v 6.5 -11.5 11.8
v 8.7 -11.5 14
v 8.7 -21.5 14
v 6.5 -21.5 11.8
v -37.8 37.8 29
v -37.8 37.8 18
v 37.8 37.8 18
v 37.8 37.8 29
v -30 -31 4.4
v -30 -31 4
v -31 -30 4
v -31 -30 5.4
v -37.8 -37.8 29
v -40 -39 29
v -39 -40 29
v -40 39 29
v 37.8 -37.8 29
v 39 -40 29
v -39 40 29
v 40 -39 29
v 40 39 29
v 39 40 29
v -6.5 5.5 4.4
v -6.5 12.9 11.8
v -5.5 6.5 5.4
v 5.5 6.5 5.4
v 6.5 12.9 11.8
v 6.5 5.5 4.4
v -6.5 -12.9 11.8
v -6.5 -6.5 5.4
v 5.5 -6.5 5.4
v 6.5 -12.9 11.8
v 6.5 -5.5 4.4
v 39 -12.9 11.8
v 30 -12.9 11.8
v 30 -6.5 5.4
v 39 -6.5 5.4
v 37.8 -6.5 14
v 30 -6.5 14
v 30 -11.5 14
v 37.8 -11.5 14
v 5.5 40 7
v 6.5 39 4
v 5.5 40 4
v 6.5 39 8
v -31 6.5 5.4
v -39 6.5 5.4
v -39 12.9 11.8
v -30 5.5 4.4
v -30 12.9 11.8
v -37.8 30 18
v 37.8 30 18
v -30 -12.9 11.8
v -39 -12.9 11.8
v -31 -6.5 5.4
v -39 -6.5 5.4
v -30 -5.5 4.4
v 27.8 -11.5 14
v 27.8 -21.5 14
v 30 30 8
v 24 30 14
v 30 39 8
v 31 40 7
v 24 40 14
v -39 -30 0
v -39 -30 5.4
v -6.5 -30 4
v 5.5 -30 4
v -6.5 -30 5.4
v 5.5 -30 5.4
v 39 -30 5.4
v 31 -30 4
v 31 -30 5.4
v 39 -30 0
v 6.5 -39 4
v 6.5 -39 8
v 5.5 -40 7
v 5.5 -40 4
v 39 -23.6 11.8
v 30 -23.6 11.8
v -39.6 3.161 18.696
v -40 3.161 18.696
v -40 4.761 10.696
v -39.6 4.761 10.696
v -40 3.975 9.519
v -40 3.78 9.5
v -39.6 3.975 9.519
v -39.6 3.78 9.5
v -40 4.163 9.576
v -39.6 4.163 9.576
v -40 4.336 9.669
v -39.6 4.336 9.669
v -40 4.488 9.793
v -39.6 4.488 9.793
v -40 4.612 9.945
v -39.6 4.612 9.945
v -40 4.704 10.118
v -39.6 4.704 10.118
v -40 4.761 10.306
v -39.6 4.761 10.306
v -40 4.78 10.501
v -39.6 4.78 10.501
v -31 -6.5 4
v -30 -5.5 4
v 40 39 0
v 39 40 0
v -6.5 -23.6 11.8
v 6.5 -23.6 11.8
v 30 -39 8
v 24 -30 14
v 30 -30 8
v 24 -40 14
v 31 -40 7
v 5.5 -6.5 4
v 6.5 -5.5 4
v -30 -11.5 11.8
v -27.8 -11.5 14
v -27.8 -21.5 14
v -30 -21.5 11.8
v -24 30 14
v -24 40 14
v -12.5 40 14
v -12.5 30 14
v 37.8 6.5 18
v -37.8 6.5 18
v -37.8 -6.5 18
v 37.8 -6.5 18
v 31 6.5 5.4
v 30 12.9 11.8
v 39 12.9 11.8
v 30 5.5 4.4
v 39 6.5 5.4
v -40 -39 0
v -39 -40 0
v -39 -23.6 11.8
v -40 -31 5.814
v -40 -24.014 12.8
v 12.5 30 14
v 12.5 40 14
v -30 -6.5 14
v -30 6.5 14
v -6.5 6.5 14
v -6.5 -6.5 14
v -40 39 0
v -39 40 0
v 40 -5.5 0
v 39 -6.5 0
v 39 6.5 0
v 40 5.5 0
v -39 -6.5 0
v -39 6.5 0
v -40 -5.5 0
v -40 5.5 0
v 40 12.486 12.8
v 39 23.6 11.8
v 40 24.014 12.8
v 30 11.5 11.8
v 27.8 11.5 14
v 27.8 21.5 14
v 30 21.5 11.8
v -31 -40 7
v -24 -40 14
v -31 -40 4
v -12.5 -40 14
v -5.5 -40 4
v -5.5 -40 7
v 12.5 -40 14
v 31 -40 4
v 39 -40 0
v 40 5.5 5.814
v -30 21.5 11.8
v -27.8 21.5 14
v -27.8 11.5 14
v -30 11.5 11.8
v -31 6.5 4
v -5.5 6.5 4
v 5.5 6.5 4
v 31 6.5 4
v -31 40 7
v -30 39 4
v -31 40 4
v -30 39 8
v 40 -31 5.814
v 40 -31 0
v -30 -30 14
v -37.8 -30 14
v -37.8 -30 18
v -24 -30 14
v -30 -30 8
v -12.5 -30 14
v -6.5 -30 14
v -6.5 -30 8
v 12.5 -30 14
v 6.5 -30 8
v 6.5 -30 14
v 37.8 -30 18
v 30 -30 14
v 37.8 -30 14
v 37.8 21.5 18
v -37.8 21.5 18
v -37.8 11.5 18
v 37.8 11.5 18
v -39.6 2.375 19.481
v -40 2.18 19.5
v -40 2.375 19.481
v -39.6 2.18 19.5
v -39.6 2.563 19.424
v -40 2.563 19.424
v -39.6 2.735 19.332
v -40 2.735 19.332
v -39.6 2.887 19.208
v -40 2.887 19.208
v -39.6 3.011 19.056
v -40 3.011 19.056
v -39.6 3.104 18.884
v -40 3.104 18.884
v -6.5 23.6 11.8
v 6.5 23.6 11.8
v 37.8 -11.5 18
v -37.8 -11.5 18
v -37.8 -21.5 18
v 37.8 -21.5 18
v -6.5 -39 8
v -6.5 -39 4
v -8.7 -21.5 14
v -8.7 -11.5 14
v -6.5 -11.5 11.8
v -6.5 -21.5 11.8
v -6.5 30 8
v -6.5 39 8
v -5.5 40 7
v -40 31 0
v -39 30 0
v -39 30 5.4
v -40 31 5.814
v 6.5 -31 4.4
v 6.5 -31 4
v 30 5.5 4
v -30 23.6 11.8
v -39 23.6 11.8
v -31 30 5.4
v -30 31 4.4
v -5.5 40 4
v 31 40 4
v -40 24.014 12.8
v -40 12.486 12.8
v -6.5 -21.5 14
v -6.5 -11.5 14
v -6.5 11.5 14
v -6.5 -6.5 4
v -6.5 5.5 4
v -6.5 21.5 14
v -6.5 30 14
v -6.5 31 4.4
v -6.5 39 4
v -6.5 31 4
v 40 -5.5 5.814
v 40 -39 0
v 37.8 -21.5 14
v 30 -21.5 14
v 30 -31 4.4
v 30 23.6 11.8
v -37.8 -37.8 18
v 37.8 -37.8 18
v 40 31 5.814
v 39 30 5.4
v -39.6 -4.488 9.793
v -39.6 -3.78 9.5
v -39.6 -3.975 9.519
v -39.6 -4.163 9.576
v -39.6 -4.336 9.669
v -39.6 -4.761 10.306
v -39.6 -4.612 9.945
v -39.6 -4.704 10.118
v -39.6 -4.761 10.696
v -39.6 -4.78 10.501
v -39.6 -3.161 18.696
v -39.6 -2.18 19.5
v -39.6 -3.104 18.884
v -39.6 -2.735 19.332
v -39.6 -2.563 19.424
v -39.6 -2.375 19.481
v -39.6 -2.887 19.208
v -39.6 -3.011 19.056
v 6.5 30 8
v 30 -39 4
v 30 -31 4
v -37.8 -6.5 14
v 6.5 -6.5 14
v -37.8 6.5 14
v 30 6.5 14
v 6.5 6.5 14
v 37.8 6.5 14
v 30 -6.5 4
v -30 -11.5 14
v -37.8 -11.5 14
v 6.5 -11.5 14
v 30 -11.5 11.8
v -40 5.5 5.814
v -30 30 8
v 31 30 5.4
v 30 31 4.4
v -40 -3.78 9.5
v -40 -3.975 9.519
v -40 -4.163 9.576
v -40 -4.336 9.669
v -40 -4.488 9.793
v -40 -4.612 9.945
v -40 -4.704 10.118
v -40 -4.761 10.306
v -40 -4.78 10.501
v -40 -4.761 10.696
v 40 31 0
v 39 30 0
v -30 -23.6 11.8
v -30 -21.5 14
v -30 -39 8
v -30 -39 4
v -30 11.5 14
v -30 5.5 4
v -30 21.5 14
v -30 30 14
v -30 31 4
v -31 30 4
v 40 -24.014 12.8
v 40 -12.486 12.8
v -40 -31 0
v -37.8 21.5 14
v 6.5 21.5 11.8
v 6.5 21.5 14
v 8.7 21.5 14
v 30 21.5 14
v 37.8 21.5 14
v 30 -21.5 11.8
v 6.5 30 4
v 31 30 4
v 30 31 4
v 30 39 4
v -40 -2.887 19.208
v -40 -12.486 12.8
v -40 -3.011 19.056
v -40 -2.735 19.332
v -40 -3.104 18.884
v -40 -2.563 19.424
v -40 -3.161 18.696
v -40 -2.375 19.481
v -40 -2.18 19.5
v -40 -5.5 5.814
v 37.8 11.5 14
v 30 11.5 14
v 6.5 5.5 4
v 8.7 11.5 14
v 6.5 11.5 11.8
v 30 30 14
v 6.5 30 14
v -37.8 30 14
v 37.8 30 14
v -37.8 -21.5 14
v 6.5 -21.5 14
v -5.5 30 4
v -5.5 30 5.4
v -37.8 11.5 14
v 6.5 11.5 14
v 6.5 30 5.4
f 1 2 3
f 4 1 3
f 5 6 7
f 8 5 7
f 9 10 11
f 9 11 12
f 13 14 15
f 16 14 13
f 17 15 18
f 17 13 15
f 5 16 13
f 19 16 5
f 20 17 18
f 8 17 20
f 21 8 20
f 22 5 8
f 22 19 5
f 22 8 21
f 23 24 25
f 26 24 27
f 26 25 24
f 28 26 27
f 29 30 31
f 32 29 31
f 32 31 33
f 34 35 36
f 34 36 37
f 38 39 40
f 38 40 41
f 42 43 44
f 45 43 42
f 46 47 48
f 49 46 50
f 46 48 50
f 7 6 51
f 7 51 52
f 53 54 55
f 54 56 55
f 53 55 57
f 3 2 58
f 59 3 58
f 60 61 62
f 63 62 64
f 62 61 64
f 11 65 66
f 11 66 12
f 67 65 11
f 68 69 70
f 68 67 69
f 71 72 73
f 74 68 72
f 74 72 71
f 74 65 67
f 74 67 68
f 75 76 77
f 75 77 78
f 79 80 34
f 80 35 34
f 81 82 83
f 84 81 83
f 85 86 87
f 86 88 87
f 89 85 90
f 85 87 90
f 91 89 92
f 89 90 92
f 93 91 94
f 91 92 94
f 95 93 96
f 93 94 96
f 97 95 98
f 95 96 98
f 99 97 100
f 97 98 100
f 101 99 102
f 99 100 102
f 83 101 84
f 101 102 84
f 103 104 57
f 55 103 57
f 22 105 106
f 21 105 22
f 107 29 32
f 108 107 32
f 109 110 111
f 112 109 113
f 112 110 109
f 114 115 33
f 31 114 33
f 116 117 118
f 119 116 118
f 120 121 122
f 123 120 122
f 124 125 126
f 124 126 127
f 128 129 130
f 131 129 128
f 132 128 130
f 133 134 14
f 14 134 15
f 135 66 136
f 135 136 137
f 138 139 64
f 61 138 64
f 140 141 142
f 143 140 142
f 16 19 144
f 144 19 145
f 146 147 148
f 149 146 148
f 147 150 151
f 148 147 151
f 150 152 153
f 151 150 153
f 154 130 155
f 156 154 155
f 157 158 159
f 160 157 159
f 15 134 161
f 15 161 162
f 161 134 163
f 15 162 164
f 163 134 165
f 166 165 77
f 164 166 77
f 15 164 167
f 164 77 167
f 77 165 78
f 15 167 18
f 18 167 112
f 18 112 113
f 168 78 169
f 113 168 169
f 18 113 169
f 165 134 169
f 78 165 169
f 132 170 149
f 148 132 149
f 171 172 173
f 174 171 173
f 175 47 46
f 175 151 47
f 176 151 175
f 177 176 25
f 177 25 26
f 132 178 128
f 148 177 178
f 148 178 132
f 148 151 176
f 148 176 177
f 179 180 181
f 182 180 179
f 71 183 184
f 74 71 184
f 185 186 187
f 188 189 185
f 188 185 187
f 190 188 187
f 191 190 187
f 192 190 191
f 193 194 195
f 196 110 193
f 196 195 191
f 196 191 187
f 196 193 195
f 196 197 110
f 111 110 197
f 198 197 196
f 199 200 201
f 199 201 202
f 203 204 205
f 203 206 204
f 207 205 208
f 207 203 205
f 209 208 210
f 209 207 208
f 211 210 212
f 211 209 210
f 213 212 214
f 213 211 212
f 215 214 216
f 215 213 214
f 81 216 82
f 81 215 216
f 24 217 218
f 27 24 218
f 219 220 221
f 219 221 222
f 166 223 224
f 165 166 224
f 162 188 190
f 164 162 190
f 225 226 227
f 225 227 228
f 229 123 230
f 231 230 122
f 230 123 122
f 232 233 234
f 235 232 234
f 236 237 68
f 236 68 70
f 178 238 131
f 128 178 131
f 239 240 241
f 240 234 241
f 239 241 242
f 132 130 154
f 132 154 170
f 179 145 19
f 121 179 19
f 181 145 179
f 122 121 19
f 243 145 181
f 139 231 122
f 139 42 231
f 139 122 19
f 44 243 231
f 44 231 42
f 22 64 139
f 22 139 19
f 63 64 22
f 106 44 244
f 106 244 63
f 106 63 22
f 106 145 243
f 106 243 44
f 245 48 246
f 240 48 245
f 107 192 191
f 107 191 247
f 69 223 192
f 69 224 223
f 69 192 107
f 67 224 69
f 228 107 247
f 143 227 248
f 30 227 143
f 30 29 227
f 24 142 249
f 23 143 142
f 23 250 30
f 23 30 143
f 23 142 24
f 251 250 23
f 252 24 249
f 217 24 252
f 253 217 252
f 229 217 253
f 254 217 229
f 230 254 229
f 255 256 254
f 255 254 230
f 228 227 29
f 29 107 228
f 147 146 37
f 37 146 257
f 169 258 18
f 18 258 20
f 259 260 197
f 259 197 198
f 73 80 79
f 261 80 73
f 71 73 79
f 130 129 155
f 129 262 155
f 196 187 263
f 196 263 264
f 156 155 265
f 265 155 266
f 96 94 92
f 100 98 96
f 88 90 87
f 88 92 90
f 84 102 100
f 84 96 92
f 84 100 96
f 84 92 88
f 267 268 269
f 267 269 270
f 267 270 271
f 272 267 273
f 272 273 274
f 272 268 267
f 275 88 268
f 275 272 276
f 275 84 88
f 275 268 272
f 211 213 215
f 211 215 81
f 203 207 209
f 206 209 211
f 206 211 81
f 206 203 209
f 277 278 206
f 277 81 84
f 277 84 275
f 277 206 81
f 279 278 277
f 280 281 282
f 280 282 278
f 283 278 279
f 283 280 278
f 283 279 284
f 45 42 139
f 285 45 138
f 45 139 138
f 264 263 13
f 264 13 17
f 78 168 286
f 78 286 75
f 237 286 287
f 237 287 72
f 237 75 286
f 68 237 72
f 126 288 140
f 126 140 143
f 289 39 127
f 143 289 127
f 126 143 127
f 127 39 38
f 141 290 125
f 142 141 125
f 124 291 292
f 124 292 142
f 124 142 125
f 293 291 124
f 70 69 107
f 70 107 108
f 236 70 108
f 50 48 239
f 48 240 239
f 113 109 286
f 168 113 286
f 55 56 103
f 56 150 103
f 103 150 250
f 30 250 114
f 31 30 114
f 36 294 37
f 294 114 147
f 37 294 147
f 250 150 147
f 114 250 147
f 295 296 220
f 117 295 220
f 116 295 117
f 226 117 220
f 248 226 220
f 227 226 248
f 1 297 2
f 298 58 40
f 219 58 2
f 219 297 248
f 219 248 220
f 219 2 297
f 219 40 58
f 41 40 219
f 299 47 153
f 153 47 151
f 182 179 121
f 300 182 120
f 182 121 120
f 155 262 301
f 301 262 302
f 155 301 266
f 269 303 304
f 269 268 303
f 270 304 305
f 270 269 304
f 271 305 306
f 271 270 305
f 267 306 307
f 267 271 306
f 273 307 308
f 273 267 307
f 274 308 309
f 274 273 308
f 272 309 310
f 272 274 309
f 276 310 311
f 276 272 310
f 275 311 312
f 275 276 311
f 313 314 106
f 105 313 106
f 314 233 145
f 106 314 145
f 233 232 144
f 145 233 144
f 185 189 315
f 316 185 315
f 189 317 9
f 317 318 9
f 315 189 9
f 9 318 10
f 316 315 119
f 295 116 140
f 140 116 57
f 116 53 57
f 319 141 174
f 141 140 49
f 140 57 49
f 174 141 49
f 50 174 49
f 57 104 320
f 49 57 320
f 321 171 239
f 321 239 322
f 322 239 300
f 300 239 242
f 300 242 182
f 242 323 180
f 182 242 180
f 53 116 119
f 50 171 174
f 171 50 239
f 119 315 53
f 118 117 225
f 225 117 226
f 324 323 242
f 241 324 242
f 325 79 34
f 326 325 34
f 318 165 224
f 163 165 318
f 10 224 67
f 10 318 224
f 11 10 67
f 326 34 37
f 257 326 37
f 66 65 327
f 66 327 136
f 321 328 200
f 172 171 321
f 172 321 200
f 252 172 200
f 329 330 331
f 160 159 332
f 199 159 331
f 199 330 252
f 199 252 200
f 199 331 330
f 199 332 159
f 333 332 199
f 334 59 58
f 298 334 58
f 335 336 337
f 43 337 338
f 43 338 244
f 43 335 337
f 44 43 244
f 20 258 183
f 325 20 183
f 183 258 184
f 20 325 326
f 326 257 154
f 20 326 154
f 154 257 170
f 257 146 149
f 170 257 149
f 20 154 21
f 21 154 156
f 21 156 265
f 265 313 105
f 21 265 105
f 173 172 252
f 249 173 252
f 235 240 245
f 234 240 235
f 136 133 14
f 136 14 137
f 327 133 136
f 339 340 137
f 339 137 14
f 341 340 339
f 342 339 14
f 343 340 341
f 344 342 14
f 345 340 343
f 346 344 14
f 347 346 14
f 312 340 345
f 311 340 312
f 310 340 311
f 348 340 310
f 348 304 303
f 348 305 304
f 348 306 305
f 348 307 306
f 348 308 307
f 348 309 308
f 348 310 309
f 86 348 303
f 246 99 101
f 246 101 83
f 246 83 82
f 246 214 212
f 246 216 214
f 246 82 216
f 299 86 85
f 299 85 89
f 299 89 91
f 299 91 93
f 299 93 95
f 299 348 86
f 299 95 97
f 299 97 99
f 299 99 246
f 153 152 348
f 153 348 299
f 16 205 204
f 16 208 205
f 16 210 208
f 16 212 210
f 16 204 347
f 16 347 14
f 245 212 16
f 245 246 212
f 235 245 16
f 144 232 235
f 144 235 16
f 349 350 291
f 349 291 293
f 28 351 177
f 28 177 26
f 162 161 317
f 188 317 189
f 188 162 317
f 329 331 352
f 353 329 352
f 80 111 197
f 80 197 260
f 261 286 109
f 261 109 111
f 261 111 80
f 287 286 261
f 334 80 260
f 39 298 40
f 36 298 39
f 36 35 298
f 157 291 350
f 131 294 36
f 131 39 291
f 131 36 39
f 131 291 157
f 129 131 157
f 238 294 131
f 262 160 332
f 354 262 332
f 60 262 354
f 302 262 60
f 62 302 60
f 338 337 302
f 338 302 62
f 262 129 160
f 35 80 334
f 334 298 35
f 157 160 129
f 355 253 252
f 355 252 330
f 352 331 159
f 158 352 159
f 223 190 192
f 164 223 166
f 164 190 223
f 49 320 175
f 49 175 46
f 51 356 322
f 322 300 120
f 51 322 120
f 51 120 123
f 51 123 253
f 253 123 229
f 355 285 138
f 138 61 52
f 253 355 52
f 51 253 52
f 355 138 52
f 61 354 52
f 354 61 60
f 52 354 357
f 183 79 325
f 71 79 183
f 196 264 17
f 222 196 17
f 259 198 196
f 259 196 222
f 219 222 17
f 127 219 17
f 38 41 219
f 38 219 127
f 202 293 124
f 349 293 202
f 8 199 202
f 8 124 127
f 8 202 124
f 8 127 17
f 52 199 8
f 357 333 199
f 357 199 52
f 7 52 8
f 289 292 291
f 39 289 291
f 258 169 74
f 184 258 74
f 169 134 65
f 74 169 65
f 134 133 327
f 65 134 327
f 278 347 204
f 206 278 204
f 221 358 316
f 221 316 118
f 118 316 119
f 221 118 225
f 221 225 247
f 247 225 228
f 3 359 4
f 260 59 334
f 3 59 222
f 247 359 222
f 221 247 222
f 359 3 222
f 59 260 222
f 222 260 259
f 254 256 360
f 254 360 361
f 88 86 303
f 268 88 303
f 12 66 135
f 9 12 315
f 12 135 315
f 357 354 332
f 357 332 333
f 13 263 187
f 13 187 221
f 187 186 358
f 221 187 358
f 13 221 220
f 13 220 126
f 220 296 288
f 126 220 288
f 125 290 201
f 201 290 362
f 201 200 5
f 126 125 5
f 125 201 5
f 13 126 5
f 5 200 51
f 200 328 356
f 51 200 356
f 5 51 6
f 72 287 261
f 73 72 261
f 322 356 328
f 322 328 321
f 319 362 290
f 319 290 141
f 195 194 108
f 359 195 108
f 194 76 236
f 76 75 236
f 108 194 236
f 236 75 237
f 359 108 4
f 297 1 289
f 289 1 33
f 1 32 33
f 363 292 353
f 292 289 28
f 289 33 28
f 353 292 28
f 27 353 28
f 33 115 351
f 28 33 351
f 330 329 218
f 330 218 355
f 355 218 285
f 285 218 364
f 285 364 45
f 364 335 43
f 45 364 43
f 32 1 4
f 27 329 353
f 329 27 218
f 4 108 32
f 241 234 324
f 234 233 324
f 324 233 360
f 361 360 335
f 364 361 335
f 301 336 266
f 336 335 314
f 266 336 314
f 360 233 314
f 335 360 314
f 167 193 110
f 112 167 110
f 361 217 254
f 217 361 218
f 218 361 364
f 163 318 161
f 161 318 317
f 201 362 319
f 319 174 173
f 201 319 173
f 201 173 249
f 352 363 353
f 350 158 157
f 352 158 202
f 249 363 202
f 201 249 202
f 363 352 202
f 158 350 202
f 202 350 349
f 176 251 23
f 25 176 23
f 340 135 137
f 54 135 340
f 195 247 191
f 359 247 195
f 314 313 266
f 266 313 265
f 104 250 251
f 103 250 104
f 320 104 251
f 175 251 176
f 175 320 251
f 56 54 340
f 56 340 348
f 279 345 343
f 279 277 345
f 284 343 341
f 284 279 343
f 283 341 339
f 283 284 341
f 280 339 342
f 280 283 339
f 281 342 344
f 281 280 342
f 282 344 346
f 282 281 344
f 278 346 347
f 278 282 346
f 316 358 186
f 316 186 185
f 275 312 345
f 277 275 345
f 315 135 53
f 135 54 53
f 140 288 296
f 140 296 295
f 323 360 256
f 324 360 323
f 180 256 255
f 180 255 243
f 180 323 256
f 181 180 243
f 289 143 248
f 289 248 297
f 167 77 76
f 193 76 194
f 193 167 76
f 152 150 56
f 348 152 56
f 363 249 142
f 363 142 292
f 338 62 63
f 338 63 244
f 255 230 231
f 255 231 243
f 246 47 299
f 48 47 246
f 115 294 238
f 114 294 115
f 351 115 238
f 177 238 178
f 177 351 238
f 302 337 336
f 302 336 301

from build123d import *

# Parameters (mm, degrees)
CROQUIS1_W                = 13
CROQUIS1_H                = 80
SALIENTE_EXTRUIR1_DEPTH   = 4
CROQUIS1_W_2              = 10
SALIENTE_EXTRUIR1_2_DEPTH = 4
SALIENTE_EXTRUIR1_3_DEPTH = 4
CROQUIS2_W                = 13
CROQUIS2_H                = 13
CROQUIS2_W_2              = 10
CROQUIS2_H_2              = 10
SALIENTE_EXTRUIR2_DEPTH   = 10
CROQUIS3_W                = 13
CROQUIS3_H                = 80
CROQUIS3_W_2              = 10
SALIENTE_EXTRUIR3_DEPTH   = 2.2
CROQUIS4_W                = 80
CROQUIS4_H                = 10
CROQUIS4_H_2              = 13
SALIENTE_EXTRUIR4_DEPTH   = 4
CROQUIS5_W                = 80
CROQUIS5_H                = 80
CROQUIS5_W_2              = 75.6
CROQUIS5_H_2              = 75.6
SALIENTE_EXTRUIR5_DEPTH   = 15
CHAFL_N2_SIZE             = 6.4
CHAFL_N3_SIZE             = 6
CHAFL_N4_SIZE             = 2.2
CORTAR_EXTRUIR1_DEPTH     = 0.4
REDONDEO1_R               = 1
CHAFL_N1_SIZE             = 1


with BuildPart() as part:
    # Croquis1 → Saliente-Extruir1 (new body)
    with BuildSketch(Plane(origin=(0, 0, 0), x_dir=(0, 1, 0), z_dir=(0, 0, 1))):
        Rectangle(CROQUIS1_W, CROQUIS1_H)
    extrude(amount=SALIENTE_EXTRUIR1_DEPTH)



with BuildPart() as body_2:
    # Croquis1 → Saliente-Extruir1 2 (new body)
    with BuildSketch(Plane(origin=(0, 0, 0), x_dir=(0, 1, 0), z_dir=(0, 0, 1))):
        with Locations((35, 0)):
            Rectangle(CROQUIS1_W_2, CROQUIS1_H)
    extrude(amount=SALIENTE_EXTRUIR1_2_DEPTH)


with BuildPart() as body_3:
    # Croquis1 → Saliente-Extruir1 3 (new body)
    with BuildSketch(Plane(origin=(0, 0, 0), x_dir=(0, 1, 0), z_dir=(0, 0, 1))):
        with Locations((-35, 0)):
            Rectangle(CROQUIS1_W_2, CROQUIS1_H)
    extrude(amount=SALIENTE_EXTRUIR1_3_DEPTH)


with BuildPart() as part_1:
    add(part.part)

    add(body_2.part)  # Saliente-Extruir2 merges body 2

    add(body_3.part)  # Saliente-Extruir2 merges body 3
    # Croquis2 → Saliente-Extruir2 (add)
    with BuildSketch(Plane.XY.offset(4)):
        Rectangle(CROQUIS2_W, CROQUIS2_H)
        with Locations((-35, 0)):
            Rectangle(CROQUIS2_W_2, CROQUIS2_H)
        with Locations((35, 0)):
            Rectangle(CROQUIS2_W_2, CROQUIS2_H)
        with Locations((0, 35)):
            Rectangle(CROQUIS2_W, CROQUIS2_H_2)
        with Locations((-35, 35)):
            Rectangle(CROQUIS2_W_2, CROQUIS2_H_2)
        with Locations((35, 35)):
            Rectangle(CROQUIS2_W_2, CROQUIS2_H_2)
        with Locations((35, -35)):
            Rectangle(CROQUIS2_W_2, CROQUIS2_H_2)
        with Locations((-35, -35)):
            Rectangle(CROQUIS2_W_2, CROQUIS2_H_2)
        with Locations((0, -35)):
            Rectangle(CROQUIS2_W, CROQUIS2_H_2)
    extrude(amount=SALIENTE_EXTRUIR2_DEPTH)

    # Croquis3 → Saliente-Extruir3 (add)
    with BuildSketch(Plane.XY.offset(14)):
        Rectangle(CROQUIS3_W, CROQUIS3_H)
        with Locations((-35, 0)):
            Rectangle(CROQUIS3_W_2, CROQUIS3_H)
        with Locations((35, 0)):
            Rectangle(CROQUIS3_W_2, CROQUIS3_H)
    extrude(amount=-SALIENTE_EXTRUIR3_DEPTH)

    # Croquis4 → Saliente-Extruir4 (add)
    with BuildSketch(Plane.XY.offset(14)):
        with Locations((0, -35)):
            Rectangle(CROQUIS4_W, CROQUIS4_H)
        Rectangle(CROQUIS4_W, CROQUIS4_H_2)
        with Locations((0, 35)):
            Rectangle(CROQUIS4_W, CROQUIS4_H)
        with Locations((0, 16.5)):
            Rectangle(CROQUIS4_W, CROQUIS4_H)
        with Locations((0, -16.5)):
            Rectangle(CROQUIS4_W, CROQUIS4_H)
    extrude(amount=SALIENTE_EXTRUIR4_DEPTH)

    # Croquis5 → Saliente-Extruir5 (add)
    with BuildSketch(Plane.XY.offset(14)):
        Rectangle(CROQUIS5_W, CROQUIS5_H)
        Rectangle(CROQUIS5_W_2, CROQUIS5_H_2, mode=Mode.SUBTRACT)
    extrude(amount=SALIENTE_EXTRUIR5_DEPTH)

    # Chaflán2
    chafl_n2_edges = [part_1.edges().sort_by_distance(p)[0] for p in [
        (0, -30, 11.8),
        (-35, 6.5, 11.8),
        (-35, -6.5, 11.8),
        (-35, 30, 11.8),
        (-35, -30, 11.8),
        (35, 6.5, 11.8),
        (35, 30, 11.8),
        (35, -6.5, 11.8),
        (35, -30, 11.8),
        (0, 6.5, 11.8),
        (0, -6.5, 11.8),
        (0, 30, 11.8),
    ]]
    chamfer(chafl_n2_edges, length=CHAFL_N2_SIZE)

    # Chaflán3
    chafl_n3_edges = [part_1.edges().sort_by_distance(p)[0] for p in [
        (-6.5, -35, 14),
        (30, -35, 14),
        (6.5, 35, 14),
        (-30, 35, 14),
        (6.5, -35, 14),
        (-6.5, 35, 14),
        (-30, -35, 14),
        (30, 35, 14),
    ]]
    chamfer(chafl_n3_edges, length=CHAFL_N3_SIZE)

    # Chaflán4
    chafl_n4_edges = [part_1.edges().sort_by_distance(p)[0] for p in [
        (30, 16.5, 14),
        (30, -16.5, 14),
        (6.5, -16.5, 14),
        (-6.5, -16.5, 14),
        (-30, -16.5, 14),
        (6.5, 16.5, 14),
        (-30, 16.5, 14),
    ]]
    chamfer(chafl_n4_edges, length=CHAFL_N4_SIZE - 0.0001)  # a hair under: the kernel refuses the full size

    # Croquis6 → Cortar-Extruir1 (cut)
    with BuildSketch(Plane(origin=(-40, 0, 0), x_dir=(0, -1, 0), z_dir=(-1, 0, 0))):
        Polygon((-5, 9.5), (5, 9.5), (3, 19.5), (-3, 19.5), align=None)
    extrude(amount=-CORTAR_EXTRUIR1_DEPTH, mode=Mode.SUBTRACT)

    # Redondeo1
    redondeo1_edges = [part_1.edges().sort_by_distance(p)[0] for p in [
        (-39.8, -3, 19.5),
        (-39.8, -5, 9.5),
        (-39.8, 5, 9.5),
        (-39.8, 3, 19.5),
    ]]
    fillet(redondeo1_edges, radius=REDONDEO1_R)

    # Chaflán1
    chafl_n1_edges = [part_1.edges().sort_by_distance(p)[0] for p in [
        (-40, 40, 14.5),
        (-40, -40, 14.5),
        (40, -40, 14.5),
        (40, 6.5, 2.7),
        (-40, 6.5, 2.7),
        (-30, 6.5, 4.7),
        (-6.5, 6.5, 4.7),
        (6.5, 6.5, 4.7),
        (30, 6.5, 4.7),
        (6.5, -6.5, 4.7),
        (-30, -6.5, 4.7),
        (-40, -6.5, 2.7),
        (40, -6.5, 2.7),
        (-40, -18.25, 11.8),
        (30, 30, 4.7),
        (-6.5, 30, 4.7),
        (-30, 30, 4.7),
        (-40, 30, 2.7),
        (40, 30, 2.7),
        (-40, 18.25, 11.8),
        (40, -30, 2.7),
        (-40, -30, 2.7),
        (-30, -30, 4.7),
        (6.5, -30, 4.7),
        (30, -30, 4.7),
        (40, 18.25, 11.8),
        (40, -18.25, 11.8),
        (-40, -9.7, 8.6),
        (-40, 26.8, 8.6),
        (-40, 9.7, 8.6),
        (-40, -26.8, 8.6),
        (40, 9.7, 8.6),
        (40, 26.8, 8.6),
        (40, -9.7, 8.6),
        (40, -26.8, 8.6),
        (30, 40, 6),
        (30, -40, 6),
        (-30, 40, 6),
        (-30, -40, 6),
        (6.5, 40, 6),
        (-6.5, -40, 6),
        (6.5, -40, 6),
        (-6.5, 40, 6),
        (40, 40, 14.5),
    ]]
    chamfer(chafl_n1_edges, length=CHAFL_N1_SIZE)


solid = part_1.part
